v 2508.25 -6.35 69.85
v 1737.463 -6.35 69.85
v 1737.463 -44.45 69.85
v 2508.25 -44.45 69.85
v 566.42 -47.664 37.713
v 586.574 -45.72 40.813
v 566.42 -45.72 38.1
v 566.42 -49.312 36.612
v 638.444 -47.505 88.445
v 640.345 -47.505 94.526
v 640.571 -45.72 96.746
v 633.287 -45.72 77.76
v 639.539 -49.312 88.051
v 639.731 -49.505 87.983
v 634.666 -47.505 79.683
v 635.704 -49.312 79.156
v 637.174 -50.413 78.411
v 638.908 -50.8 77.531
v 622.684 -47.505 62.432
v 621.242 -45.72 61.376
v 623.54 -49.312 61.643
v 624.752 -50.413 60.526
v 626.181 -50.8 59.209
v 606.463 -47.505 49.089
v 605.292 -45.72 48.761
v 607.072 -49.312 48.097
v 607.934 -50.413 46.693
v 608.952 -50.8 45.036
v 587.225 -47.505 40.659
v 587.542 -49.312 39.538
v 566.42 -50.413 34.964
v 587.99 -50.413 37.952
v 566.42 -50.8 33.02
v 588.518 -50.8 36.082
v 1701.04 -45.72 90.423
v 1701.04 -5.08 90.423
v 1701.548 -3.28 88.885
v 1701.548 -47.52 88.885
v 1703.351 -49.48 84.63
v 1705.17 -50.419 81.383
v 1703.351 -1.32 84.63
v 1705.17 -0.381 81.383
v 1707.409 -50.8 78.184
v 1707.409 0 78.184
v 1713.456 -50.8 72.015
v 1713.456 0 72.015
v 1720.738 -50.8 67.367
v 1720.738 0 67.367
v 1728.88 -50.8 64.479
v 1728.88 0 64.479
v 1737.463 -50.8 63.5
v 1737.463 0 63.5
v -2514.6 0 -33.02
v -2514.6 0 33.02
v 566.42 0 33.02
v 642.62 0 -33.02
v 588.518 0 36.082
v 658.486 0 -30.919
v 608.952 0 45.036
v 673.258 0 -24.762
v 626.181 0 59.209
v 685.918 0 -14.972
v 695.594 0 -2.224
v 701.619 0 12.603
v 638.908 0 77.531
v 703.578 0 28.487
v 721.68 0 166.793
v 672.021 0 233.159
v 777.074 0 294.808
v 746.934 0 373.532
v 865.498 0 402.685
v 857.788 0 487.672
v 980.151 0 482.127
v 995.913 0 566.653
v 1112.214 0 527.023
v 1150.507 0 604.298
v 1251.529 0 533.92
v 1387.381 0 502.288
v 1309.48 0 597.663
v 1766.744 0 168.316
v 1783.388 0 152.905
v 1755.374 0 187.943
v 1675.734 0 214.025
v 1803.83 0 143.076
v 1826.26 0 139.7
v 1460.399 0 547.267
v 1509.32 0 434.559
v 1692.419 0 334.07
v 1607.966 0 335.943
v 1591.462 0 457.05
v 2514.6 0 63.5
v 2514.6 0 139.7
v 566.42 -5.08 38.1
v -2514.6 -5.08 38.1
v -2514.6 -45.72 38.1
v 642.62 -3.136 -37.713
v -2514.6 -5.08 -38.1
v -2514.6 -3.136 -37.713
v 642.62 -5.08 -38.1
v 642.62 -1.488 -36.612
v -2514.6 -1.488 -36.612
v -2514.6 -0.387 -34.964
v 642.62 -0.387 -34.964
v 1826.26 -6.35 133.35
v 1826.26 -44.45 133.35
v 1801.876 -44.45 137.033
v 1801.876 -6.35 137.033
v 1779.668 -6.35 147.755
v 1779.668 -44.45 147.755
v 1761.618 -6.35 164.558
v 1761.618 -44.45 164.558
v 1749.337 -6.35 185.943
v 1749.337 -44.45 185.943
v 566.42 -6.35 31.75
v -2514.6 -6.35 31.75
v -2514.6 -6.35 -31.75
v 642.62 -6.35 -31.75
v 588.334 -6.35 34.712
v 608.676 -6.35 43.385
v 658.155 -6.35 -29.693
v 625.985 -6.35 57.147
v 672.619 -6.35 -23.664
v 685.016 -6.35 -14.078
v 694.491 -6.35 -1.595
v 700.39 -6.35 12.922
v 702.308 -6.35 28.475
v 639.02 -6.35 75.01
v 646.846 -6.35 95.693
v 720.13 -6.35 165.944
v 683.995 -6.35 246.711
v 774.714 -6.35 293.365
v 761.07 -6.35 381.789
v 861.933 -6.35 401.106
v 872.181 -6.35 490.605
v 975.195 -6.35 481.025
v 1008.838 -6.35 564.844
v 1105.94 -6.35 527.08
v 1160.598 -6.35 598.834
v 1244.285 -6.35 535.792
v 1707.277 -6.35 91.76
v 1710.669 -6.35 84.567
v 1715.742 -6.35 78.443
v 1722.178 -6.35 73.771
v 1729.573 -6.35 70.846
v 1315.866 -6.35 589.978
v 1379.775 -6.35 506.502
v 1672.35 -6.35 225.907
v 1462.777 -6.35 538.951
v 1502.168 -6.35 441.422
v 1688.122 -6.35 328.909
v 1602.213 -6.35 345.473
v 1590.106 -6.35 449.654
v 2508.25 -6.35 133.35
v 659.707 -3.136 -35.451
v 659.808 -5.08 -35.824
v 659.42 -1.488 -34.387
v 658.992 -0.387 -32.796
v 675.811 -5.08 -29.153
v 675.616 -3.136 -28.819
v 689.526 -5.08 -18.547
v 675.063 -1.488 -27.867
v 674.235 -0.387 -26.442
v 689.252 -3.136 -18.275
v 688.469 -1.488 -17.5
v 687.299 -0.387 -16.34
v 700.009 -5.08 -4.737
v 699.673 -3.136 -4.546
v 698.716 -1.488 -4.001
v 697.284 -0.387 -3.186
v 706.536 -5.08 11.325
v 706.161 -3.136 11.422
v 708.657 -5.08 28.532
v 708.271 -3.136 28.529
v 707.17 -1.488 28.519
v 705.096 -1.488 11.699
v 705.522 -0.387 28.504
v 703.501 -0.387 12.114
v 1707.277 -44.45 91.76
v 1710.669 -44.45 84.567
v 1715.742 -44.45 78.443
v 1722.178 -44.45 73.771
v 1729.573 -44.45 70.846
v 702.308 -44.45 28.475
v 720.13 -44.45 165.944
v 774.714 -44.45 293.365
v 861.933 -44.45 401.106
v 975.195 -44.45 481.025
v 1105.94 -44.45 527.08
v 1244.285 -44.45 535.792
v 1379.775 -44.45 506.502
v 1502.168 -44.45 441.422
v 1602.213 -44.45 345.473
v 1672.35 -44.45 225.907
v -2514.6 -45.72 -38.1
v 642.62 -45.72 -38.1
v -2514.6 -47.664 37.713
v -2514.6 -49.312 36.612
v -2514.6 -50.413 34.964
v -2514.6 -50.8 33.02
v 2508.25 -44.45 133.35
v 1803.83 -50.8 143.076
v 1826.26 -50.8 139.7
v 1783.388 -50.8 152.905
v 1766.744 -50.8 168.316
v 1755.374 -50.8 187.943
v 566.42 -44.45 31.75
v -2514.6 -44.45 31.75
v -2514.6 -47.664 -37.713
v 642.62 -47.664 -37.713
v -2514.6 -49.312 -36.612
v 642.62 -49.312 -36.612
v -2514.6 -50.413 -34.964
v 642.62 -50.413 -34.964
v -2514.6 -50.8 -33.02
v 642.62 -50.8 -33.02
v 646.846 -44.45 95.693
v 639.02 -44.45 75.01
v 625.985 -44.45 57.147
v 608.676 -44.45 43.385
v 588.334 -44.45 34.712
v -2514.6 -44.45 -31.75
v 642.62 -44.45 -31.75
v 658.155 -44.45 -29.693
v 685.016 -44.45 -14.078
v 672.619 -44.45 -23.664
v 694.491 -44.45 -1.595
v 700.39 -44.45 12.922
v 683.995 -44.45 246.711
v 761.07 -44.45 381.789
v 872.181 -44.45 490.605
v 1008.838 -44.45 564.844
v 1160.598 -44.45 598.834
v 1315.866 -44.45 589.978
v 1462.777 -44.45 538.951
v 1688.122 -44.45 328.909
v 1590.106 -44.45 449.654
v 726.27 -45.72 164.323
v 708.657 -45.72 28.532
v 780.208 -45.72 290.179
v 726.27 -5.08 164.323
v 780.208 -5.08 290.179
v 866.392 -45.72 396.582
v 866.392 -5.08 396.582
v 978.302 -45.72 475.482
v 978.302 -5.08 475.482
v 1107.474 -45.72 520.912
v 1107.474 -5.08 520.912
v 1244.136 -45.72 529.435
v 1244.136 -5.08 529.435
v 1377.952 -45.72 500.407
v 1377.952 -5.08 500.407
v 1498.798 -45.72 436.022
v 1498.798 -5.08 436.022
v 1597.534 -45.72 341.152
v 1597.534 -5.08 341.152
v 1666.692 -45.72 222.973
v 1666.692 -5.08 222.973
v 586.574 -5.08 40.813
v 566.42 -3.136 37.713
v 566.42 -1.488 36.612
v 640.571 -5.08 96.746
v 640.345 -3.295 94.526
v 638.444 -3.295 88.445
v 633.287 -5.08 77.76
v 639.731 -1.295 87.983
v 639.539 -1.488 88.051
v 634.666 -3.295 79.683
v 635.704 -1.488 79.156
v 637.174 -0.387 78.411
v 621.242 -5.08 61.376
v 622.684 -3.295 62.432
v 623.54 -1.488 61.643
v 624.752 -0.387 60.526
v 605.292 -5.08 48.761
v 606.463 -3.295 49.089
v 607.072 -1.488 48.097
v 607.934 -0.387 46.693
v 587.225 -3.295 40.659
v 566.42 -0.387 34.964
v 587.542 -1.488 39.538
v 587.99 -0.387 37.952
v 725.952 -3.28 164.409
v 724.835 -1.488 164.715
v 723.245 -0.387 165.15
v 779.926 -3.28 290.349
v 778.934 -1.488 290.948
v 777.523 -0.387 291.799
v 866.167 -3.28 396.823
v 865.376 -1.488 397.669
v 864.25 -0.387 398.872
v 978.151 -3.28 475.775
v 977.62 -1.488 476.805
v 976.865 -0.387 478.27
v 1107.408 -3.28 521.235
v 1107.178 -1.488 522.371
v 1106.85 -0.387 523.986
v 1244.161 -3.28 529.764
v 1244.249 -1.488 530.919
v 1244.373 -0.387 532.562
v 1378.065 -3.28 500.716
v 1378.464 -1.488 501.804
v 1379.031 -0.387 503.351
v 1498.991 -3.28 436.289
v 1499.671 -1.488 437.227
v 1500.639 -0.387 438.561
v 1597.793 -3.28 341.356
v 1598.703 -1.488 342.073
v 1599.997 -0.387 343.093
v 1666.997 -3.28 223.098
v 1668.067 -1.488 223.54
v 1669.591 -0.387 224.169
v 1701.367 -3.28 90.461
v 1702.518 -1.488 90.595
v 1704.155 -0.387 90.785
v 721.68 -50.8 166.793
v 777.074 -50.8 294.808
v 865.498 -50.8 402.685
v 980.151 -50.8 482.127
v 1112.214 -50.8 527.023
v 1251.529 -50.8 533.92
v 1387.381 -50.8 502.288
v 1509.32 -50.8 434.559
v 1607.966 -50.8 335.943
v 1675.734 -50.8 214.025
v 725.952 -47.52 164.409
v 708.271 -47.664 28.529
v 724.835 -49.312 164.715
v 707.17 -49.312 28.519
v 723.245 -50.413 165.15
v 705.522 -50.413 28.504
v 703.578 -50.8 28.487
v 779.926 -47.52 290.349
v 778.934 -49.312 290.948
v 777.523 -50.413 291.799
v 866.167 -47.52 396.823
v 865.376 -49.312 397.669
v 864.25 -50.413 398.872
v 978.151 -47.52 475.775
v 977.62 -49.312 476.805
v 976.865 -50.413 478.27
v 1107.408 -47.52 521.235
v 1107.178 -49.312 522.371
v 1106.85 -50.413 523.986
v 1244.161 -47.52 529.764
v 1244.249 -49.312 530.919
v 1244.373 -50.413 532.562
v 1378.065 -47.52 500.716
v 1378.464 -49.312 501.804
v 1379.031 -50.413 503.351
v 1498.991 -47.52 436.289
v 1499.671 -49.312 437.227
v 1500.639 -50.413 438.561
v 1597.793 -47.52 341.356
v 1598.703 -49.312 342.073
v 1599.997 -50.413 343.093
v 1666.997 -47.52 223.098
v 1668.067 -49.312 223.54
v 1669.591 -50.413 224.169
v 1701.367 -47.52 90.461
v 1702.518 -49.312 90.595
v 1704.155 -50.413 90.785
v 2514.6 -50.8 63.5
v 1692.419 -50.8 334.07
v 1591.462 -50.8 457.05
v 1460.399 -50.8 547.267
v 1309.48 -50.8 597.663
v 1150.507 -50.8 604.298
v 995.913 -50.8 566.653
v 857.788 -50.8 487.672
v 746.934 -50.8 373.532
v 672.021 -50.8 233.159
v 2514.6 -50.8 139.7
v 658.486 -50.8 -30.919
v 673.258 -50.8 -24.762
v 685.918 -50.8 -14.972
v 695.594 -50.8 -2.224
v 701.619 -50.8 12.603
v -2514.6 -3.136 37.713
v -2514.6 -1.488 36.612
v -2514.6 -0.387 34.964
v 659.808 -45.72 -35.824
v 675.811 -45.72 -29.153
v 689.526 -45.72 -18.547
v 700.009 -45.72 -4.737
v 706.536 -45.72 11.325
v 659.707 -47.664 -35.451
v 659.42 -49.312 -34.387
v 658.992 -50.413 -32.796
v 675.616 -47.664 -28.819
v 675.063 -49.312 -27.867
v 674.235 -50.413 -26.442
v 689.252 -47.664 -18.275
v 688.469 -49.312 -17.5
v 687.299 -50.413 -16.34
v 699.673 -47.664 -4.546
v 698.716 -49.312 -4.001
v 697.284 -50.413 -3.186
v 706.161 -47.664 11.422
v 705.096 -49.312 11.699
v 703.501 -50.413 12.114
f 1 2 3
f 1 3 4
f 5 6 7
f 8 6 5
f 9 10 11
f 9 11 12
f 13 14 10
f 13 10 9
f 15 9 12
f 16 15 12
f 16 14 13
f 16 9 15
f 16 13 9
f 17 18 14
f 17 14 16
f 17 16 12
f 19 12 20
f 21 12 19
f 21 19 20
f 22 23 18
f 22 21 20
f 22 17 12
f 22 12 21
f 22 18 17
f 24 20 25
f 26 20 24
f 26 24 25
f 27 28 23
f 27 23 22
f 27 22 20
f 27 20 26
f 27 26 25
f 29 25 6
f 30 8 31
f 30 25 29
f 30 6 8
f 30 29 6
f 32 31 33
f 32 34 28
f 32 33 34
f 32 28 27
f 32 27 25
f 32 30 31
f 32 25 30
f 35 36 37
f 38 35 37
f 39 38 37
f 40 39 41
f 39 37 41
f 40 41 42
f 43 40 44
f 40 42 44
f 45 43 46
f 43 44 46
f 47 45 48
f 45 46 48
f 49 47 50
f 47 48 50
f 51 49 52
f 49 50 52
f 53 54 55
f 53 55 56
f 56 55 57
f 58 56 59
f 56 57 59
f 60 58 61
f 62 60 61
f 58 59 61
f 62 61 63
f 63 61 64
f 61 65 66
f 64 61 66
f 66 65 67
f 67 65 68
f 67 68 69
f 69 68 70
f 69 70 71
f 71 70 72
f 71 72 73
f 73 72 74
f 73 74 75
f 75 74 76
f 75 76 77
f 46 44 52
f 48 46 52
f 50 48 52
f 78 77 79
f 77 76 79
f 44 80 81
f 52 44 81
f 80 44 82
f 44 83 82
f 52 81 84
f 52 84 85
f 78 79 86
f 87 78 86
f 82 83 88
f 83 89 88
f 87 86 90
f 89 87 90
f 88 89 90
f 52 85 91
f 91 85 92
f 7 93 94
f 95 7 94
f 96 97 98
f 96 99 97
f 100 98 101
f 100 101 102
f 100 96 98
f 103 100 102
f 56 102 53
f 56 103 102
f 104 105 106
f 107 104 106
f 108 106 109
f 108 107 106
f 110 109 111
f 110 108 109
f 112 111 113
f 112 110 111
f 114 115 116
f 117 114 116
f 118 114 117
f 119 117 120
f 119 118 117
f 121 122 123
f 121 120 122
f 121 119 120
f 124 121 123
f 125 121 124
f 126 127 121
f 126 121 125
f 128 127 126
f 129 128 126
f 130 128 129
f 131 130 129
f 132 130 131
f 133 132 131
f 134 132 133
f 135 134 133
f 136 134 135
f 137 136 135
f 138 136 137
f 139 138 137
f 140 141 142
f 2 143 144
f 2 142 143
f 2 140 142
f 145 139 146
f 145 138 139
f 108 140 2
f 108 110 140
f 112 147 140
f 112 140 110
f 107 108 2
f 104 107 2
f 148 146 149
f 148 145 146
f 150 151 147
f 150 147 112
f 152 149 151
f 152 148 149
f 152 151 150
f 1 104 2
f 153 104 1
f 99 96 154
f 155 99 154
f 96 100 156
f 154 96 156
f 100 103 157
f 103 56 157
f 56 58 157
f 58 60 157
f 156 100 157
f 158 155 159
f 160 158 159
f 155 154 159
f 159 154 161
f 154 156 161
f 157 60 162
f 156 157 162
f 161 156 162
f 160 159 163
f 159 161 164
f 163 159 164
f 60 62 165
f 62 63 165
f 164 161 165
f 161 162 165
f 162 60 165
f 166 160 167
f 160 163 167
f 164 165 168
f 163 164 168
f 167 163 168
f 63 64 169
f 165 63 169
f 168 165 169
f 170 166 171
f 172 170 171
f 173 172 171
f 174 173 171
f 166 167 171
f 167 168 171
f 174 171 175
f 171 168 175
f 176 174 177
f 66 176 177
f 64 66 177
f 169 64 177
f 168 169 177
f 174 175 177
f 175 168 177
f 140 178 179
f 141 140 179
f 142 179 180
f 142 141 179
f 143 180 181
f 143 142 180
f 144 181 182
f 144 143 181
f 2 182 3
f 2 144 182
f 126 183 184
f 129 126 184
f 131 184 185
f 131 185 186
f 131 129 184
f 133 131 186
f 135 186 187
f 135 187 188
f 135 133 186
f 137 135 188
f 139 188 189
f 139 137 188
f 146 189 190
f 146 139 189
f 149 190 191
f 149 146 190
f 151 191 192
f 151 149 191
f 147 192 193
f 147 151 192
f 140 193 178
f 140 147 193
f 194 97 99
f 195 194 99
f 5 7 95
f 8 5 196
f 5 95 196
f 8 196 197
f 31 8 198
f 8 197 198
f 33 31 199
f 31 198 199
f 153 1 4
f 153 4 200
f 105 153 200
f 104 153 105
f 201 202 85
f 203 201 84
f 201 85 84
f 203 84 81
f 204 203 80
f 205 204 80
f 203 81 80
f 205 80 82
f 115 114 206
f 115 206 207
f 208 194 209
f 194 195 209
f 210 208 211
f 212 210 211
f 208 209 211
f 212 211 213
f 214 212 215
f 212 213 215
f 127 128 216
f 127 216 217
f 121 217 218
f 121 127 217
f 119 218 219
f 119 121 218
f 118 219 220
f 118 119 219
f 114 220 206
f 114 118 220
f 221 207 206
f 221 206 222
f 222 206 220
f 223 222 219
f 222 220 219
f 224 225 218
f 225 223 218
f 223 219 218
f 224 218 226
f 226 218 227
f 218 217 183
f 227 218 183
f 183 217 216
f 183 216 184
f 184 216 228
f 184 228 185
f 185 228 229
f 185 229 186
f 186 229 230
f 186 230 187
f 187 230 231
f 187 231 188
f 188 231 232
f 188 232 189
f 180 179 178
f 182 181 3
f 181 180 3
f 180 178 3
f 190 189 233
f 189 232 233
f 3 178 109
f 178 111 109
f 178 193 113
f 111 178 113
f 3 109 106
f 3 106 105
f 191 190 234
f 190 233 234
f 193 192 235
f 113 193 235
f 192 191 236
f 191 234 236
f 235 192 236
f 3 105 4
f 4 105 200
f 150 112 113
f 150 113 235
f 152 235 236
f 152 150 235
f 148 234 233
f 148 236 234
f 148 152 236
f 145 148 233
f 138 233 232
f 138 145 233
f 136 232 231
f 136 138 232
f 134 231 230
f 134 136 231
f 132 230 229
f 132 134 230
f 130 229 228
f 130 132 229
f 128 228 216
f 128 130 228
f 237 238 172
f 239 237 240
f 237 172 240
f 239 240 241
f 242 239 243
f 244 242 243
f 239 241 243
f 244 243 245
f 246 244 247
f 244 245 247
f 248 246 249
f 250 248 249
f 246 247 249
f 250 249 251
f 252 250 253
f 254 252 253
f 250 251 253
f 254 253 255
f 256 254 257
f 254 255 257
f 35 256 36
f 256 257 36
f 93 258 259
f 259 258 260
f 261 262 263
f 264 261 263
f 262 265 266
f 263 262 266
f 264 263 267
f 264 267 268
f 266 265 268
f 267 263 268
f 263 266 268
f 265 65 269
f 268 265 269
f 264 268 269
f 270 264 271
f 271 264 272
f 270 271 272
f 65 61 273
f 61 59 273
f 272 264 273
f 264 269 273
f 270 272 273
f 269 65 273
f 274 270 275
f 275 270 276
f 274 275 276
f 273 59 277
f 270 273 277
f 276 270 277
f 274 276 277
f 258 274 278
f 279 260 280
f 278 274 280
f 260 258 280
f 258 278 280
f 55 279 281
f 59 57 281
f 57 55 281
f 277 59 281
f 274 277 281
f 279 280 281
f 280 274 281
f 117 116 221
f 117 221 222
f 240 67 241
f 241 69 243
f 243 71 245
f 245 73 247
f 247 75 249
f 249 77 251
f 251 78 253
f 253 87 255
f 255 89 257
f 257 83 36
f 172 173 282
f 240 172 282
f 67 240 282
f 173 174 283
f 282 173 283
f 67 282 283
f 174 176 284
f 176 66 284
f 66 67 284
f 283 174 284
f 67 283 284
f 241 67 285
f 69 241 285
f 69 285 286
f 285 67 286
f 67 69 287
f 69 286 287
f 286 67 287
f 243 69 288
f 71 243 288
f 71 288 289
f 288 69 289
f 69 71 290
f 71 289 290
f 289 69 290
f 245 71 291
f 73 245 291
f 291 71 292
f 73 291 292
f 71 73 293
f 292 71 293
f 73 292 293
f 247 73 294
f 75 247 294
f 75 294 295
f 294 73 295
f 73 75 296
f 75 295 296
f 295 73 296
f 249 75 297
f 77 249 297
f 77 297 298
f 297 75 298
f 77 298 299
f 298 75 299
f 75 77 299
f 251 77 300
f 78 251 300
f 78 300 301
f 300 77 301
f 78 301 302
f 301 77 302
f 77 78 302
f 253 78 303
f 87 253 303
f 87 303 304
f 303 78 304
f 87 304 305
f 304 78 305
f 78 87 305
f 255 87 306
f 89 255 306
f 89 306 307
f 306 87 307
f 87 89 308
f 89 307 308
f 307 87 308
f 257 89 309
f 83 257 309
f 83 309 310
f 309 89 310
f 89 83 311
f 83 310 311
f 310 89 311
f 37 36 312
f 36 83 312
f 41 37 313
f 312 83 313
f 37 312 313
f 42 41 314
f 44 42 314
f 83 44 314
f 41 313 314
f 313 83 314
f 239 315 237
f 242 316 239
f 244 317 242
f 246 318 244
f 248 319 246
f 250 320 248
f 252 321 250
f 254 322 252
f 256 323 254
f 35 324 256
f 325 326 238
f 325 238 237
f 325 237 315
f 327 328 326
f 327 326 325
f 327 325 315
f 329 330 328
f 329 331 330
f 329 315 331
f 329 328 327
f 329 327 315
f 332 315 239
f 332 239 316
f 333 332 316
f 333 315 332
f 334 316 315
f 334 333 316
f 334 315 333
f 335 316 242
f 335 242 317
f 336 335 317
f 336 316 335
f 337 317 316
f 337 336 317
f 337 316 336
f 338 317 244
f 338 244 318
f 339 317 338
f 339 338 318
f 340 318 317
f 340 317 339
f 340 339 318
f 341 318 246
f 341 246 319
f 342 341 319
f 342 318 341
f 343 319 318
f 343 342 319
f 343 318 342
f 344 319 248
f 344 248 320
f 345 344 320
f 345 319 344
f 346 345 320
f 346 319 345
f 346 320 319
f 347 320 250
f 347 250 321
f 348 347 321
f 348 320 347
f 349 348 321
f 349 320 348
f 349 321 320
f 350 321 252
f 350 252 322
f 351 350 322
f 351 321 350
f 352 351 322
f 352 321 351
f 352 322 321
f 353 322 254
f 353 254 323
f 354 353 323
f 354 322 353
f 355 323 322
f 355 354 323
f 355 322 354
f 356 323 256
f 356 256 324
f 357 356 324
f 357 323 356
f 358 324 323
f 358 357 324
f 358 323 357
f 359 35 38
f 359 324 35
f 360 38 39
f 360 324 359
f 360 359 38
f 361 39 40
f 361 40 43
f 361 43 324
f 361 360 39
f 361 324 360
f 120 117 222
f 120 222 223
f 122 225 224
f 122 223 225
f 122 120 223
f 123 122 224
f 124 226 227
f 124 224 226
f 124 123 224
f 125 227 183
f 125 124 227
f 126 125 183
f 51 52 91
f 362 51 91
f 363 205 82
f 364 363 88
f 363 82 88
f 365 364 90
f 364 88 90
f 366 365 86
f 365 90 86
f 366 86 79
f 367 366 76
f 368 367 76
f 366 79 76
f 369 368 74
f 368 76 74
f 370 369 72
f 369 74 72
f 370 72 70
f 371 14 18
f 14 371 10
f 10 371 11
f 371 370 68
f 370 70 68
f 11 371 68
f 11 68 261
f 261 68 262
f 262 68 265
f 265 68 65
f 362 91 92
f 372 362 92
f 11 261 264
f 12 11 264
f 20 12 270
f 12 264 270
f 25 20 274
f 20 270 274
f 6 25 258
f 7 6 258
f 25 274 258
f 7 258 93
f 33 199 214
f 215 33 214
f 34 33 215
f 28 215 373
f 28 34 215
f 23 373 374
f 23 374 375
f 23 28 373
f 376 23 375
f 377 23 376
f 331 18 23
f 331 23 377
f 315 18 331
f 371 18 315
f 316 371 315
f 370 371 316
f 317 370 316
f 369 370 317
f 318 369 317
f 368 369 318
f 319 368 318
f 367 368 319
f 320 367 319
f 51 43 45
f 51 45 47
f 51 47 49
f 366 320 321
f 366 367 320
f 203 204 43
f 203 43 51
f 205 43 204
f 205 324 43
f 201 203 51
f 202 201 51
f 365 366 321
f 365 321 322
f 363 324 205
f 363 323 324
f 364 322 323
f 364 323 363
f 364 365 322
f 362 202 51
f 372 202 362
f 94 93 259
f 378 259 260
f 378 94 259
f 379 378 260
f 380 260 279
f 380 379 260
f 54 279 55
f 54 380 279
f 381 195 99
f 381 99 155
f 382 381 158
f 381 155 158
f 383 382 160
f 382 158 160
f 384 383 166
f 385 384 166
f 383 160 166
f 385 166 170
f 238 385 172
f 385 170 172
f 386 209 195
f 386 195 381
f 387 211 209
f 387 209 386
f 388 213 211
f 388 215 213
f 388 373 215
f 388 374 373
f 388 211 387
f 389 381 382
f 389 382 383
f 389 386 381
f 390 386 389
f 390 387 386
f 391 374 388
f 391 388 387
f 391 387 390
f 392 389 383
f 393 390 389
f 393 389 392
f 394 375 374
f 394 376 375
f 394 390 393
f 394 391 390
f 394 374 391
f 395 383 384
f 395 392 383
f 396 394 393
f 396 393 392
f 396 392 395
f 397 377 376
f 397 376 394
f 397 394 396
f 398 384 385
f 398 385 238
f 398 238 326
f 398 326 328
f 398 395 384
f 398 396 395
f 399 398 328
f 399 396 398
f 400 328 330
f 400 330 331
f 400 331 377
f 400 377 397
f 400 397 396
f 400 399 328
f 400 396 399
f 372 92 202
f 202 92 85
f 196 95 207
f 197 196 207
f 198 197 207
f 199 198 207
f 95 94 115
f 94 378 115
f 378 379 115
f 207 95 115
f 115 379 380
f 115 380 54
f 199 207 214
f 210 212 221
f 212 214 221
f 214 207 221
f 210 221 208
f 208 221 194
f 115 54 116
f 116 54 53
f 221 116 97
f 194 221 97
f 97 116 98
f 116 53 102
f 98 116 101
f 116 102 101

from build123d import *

# Parameters (mm, degrees)
F1_DEPTH = 50.8
F2_T     = -6.35
F3_R     = 5.08


# Not quite as in the source:
# - a feature names something its author has since deleted; it is built from what else it names


with BuildPart() as f1:
    # F0 (on Front) → F1 (new body)
    with BuildSketch(Plane.XZ):
        with BuildLine():
            Line((-2514.6, 38.1), (-2514.6, -38.1))
            Line((-2514.6, -38.1), (642.62, -38.1))
            ThreePointArc((642.62, -38.1), (689.5262652886, -18.5474593485), (708.6573440579, 28.5322750855))
            ThreePointArc((708.6573440579, 28.5322750855), (1175.5106386372, 529.8946007496), (1701.0397320407, 90.4229267577))
            ThreePointArc((1701.0397320407, 90.4229267577), (1714.8164995695, 70.9613276191), (1737.4633923968, 63.5))
            Line((1737.4633923968, 63.5), (2514.6, 63.5))
            Line((2514.6, 63.5), (2514.6, 139.7))
            Line((2514.6, 139.7), (1826.26, 139.7))
            ThreePointArc((1826.26, 139.7), (1783.3875941693, 152.9047873384), (1755.3740072802, 187.9426031947))
            ThreePointArc((1755.3740072802, 187.9426031947), (1160.1113564946, 605.1657592852), (640.5706087962, 96.7464472213))
            ThreePointArc((640.5706087962, 96.7464472213), (613.6897539567, 54.5337021318), (566.42, 38.1))
            Line((566.42, 38.1), (-2514.6, 38.1))
        make_face()
    extrude(amount=F1_DEPTH)

    # F2
    f2_openings = [f1.faces().sort_by_distance(p)[0] for p in [
        (-2514.6, -25.4, 0),
    ]]
    offset(amount=F2_T, openings=f2_openings, kind=Kind.INTERSECTION)

    # F3
    f3_edges = [f1.edges().sort_by_distance(p)[0] for p in [
        (-974.09, -50.8, 38.1),
        (-974.09, 0, 38.1),
        (-935.99, 0, -38.1),
        (-935.99, -50.8, -38.1),
    ]]
    fillet(f3_edges, radius=F3_R)


solid = f1.part
